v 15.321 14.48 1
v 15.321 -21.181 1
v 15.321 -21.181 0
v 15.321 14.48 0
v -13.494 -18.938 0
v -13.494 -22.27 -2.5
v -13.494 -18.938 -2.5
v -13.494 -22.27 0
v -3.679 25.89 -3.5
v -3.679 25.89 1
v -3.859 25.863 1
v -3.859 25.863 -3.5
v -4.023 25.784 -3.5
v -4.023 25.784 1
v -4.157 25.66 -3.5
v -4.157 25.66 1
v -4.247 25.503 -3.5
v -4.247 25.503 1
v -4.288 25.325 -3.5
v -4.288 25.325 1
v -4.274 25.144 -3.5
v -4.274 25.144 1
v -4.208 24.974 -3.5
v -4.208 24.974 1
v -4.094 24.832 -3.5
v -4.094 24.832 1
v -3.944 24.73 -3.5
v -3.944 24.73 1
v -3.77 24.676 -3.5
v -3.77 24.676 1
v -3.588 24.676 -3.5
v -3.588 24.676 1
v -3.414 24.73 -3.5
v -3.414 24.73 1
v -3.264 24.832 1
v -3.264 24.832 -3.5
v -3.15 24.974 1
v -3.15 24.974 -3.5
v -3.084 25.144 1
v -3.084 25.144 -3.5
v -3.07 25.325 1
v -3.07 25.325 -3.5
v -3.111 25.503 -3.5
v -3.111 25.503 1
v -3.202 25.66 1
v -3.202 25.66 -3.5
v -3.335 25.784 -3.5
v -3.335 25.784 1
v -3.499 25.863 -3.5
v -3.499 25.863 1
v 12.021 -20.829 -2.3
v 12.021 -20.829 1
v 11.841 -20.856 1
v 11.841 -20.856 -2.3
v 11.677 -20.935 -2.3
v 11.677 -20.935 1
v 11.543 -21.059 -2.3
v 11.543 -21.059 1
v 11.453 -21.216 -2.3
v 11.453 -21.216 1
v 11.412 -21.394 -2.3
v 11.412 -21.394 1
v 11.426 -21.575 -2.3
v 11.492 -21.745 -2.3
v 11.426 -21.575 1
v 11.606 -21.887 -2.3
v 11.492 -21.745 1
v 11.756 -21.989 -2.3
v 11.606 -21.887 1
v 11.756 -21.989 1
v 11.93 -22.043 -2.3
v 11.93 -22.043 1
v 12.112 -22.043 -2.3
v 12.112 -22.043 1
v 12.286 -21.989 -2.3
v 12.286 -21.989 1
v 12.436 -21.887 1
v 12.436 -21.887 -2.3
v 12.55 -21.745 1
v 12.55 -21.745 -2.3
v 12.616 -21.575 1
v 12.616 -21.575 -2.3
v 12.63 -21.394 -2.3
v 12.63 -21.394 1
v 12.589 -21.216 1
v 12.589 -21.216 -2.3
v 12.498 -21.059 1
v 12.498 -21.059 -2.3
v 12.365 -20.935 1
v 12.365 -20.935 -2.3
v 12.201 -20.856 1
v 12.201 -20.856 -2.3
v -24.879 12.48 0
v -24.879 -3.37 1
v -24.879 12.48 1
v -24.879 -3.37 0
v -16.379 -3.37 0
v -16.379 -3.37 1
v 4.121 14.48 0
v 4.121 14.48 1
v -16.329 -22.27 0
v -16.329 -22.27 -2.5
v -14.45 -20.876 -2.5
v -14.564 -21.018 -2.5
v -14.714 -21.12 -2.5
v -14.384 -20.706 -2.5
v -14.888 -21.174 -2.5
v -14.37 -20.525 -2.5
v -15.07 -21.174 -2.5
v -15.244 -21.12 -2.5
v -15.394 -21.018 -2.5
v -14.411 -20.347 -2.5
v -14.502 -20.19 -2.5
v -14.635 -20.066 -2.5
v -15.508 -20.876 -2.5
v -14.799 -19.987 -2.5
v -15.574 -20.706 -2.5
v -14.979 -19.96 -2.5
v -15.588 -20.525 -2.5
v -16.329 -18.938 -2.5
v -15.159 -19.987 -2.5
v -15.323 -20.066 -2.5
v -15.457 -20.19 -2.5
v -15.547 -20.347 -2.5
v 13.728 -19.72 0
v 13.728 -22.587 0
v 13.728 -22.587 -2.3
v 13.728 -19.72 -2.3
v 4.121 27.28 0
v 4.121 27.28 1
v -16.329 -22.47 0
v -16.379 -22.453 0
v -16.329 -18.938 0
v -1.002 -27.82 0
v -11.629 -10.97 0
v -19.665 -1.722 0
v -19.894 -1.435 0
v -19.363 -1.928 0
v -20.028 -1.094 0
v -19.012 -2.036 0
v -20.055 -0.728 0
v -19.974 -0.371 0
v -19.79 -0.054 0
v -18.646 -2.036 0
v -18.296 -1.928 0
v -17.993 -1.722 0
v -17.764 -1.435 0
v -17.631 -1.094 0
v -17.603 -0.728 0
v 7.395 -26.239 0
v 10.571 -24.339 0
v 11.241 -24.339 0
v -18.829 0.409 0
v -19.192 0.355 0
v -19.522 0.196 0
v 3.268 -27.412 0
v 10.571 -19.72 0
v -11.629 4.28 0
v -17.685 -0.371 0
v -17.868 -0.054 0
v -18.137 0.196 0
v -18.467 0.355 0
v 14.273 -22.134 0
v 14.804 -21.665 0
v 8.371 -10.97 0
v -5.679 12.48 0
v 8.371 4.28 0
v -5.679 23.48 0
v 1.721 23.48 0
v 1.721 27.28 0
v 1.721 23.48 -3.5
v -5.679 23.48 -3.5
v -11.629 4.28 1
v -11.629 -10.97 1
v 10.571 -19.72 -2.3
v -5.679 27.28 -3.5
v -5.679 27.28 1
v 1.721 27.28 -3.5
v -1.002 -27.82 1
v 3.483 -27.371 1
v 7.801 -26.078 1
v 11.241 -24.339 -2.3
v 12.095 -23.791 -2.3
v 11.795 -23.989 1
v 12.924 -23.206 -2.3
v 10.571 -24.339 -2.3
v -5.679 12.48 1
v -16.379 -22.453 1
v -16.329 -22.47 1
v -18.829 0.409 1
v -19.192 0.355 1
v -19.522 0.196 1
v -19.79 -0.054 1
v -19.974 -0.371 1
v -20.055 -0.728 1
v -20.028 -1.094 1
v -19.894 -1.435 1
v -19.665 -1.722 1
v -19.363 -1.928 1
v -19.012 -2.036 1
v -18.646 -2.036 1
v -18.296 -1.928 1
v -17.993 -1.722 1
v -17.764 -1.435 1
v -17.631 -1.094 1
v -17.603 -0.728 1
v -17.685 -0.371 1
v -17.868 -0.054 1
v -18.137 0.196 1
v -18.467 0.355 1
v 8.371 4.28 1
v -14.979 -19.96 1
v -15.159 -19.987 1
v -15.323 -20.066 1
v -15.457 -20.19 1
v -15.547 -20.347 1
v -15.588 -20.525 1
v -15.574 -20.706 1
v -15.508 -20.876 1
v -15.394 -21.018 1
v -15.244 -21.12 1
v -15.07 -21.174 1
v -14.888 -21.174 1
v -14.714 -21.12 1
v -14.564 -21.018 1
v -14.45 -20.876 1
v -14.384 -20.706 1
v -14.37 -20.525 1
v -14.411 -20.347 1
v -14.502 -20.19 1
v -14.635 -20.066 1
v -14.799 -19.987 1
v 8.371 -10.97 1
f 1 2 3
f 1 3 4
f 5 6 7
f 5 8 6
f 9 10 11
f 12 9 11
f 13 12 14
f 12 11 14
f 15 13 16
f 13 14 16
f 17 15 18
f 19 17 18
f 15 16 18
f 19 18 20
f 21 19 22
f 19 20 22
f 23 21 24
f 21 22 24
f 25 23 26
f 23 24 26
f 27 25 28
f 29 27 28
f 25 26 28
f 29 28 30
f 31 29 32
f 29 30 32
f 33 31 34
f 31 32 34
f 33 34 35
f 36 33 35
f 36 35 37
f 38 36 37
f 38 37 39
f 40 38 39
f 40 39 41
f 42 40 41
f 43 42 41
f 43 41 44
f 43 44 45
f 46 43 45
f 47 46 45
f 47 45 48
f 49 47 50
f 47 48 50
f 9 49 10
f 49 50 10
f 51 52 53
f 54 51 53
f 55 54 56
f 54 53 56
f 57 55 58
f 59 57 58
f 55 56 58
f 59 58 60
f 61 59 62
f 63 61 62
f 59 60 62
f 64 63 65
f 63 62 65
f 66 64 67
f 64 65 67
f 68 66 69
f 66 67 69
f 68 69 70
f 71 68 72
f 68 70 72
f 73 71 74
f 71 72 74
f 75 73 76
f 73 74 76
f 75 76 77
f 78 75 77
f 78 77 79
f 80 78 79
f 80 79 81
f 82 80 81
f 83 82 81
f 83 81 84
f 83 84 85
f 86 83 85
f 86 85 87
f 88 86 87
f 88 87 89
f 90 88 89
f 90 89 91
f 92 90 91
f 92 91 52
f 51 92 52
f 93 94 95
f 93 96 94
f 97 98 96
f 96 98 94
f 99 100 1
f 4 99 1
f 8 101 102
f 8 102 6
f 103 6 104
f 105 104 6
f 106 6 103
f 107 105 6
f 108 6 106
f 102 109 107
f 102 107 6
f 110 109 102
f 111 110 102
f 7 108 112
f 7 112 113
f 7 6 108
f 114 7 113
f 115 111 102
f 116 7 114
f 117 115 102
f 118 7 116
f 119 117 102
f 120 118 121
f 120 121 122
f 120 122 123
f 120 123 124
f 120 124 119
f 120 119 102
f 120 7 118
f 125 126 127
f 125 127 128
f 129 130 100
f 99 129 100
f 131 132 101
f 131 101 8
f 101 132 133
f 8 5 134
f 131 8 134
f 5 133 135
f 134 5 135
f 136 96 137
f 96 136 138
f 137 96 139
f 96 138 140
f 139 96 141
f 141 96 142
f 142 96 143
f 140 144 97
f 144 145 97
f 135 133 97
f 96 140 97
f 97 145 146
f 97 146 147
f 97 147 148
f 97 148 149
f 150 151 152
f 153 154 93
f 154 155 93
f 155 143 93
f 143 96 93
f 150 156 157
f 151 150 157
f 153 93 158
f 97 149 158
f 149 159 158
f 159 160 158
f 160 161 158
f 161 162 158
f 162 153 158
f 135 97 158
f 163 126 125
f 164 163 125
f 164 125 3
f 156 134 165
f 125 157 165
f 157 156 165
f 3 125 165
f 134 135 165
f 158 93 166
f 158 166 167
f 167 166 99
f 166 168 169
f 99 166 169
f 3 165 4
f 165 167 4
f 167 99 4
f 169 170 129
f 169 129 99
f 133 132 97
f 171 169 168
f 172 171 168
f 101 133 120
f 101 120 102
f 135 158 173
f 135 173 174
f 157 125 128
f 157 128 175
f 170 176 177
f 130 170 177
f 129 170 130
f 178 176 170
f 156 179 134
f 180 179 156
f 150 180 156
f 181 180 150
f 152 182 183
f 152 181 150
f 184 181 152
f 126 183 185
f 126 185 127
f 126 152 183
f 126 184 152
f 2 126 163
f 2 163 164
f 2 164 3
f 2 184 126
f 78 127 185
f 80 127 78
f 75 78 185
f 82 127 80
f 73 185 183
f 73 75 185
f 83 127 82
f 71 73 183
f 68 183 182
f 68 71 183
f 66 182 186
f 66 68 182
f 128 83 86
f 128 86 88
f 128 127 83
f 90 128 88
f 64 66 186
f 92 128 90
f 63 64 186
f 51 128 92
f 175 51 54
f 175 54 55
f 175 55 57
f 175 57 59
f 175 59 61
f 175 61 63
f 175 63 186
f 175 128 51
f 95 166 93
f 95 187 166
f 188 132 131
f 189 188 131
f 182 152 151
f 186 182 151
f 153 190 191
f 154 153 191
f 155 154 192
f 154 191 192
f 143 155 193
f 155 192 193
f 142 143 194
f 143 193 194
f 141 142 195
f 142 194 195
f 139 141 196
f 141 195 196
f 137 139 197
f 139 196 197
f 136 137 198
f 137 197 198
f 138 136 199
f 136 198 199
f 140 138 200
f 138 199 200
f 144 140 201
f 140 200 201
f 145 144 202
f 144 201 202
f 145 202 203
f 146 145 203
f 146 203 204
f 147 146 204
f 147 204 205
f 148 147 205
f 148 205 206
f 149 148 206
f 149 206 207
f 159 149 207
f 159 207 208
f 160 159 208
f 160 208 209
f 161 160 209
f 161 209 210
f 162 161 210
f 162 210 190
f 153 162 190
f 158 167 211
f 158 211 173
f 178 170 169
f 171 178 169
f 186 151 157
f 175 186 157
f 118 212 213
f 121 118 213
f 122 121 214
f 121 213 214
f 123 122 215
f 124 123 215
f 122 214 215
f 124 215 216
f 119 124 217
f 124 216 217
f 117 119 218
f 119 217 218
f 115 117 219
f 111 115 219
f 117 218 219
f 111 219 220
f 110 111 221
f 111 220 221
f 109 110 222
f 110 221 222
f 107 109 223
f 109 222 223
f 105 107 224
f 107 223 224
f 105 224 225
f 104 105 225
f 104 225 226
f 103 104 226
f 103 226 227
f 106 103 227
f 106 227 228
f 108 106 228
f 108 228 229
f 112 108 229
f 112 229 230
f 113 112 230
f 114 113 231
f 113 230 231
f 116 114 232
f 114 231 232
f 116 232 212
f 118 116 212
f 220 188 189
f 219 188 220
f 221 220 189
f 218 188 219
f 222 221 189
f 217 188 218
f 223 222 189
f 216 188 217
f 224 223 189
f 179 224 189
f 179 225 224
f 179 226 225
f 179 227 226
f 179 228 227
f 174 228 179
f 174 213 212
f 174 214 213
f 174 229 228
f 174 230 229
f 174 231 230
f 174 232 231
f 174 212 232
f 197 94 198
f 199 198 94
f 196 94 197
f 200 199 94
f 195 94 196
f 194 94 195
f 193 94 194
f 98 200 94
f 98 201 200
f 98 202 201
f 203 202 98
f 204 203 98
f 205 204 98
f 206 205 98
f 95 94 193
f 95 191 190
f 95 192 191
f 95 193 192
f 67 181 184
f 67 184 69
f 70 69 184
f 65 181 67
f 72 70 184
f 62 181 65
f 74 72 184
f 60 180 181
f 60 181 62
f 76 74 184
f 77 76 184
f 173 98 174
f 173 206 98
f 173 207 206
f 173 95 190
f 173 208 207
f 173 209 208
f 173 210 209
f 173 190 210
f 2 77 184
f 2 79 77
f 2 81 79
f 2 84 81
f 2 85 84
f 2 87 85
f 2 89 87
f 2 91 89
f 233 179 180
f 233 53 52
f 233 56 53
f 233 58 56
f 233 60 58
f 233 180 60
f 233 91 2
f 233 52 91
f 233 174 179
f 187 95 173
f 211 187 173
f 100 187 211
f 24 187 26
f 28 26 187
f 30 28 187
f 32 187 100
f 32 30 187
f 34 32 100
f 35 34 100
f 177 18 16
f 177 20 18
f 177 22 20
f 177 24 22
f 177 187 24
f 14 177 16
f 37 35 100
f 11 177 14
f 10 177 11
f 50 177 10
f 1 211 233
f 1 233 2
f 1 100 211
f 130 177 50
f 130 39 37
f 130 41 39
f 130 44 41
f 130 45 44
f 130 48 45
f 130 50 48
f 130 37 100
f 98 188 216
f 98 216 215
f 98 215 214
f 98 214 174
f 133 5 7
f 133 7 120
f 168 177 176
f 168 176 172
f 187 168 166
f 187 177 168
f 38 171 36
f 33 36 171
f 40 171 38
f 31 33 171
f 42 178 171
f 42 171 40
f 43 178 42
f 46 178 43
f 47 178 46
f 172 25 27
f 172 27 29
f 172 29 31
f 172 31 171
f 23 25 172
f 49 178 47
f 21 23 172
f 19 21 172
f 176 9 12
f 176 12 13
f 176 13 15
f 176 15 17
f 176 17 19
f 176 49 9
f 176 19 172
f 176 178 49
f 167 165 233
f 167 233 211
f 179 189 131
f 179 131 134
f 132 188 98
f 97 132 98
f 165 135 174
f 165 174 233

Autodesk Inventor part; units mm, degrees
ref_plane "YZ Plane" through (0, 0, 0) normal (1, 0, 0) x (0, 1, 0)
ref_plane "XZ Plane" through (0, 0, 0) normal (0, 1, 0) x (-1, 0, 0)
ref_plane "XY Plane" through (0, 0, 0) normal (0, 0, 1) x (1, 0, 0)
sketch "Skizze1" plane through (0, 0, 0) normal (0, 0, 1) x (1, 0, 0)
  circle A0 centre (-18.8292, -0.8203) radius 1.45 construction
  line L0 (-24.8792, -2.7703) -> (-24.8792, 8.6797) construction
  arc A1 (-11.8792, -25.2203) -> (6.3208, -26.6782) centre (-1.0025, -3.77) ccw construction
  circle A2 centre (-14.9792, -20.5703) radius 0.9 construction
  circle A3 centre (12.0208, -21.4394) radius 0.9 construction
  circle A4 centre (-3.6792, 25.2797) radius 0.9 construction
  line L1 (-5.6792, 27.2797) -> (3.4208, 27.2797) construction
  line L2 (25.1208, 7.4797) -> (25.1208, -1.5203) construction
  line L3 (25.1208, -27.8203) -> (-24.8792, -27.8203)
  line L4 (-24.8792, -27.8203) -> (-24.8792, 27.2797)
  line L5 (-24.8792, 27.2797) -> (25.1208, 27.2797)
  line L6 (25.1208, 27.2797) -> (25.1208, -27.8203)
  line L7 (4.6208, 0.2797) -> (4.6208, -6.9703) construction
  line L8 (-4.8792, 0.2797) -> (4.6208, 0.2797) construction
  line L9 (-4.8792, -6.9703) -> (-4.8792, 0.2797) construction
  line L10 (4.6208, -6.9703) -> (-4.8792, -6.9703) construction
  line L11 (-2.2292, 2.2797) -> (1.9708, 2.2797) construction
  line L12 (6.3708, 2.2797) -> (1.9708, 2.2797) construction
  line L13 (6.3708, -8.9703) -> (6.3708, 2.2797) construction
  line L14 (1.9708, -8.9703) -> (6.3708, -8.9703) construction
  line L15 (1.9708, -8.9703) -> (-2.2292, -8.9703) construction
  line L16 (-6.6292, -8.9703) -> (-2.2292, -8.9703) construction
  line L17 (-6.6292, 2.2797) -> (-6.6292, -8.9703) construction
  line L18 (-2.2292, 2.2797) -> (-6.6292, 2.2797) construction
  line L19 (-11.6292, -10.9703) -> (8.3708, -10.9703)
  line L20 (8.3708, -10.9703) -> (8.3708, 4.2797)
  line L21 (8.3708, 4.2797) -> (-11.6292, 4.2797)
  line L22 (-11.6292, 4.2797) -> (-11.6292, -10.9703)
  point P0 (0, 0)
  dimension "d48" = 2
  dimension "d49" = 2
  dimension "d50" = 2
  dimension "d51" = 5
extrude "Extrusion1" add sketch "Skizze1" along normal blind 1
sketch "Skizze2" plane through (0, 0, 0) normal (0, 0, -1) x (-1, 0, 0)
  circle A0 centre (14.9792, -20.5703) radius 0.9 projected
  circle A1 centre (-12.0208, -21.4394) radius 0.9 construction
  circle A2 centre (3.6792, 25.2797) radius 0.9 construction
  circle A3 centre (14.9792, -20.5703) radius 0.9 projected
  circle A4 centre (9.7292, -19.9703) radius 0.75 projected
  line L0 (17.9792, -20.8203) -> (16.3292, -20.8203) construction
  line L1 (7.7292, -22.4703) -> (11.8792, -22.4703) construction
  line L2 (7.7292, -17.4703) -> (7.7292, -22.4703) construction
  line L3 (16.3292, -17.4703) -> (7.7292, -17.4703) construction
  line L4 (16.3292, -20.8203) -> (16.3292, -17.4703) construction
  line L5 (16.3292, -22.2703) -> (7.9292, -22.2703)
  line L6 (7.9292, -22.2703) -> (7.9292, -17.6703)
  line L7 (7.9292, -17.6703) -> (16.3292, -17.6703)
  line L8 (16.3292, -17.6703) -> (16.3292, -22.2703)
  line L9 (11.8792, -22.2703) -> (12.162, -22.2703) construction
  line L10 (16.3292, -17.6703) -> (12.3496, -17.6703)
  line L11 (12.3496, -17.6703) -> (12.3496, -22.2703)
  line L12 (12.3496, -22.2703) -> (16.3292, -22.2703)
  line L13 (16.3292, -22.2703) -> (16.3292, -17.6703)
  line L14 (16.3292, -22.2703) -> (13.494, -22.2703)
  line L15 (13.494, -22.2703) -> (13.494, -18.9379)
  line L16 (13.494, -18.9379) -> (16.3292, -18.9379)
  line L17 (16.3292, -18.9379) -> (16.3292, -22.2703)
  point P0 (0, 0)
  dimension "d3" = 0.2
  dimension "d4" = 0.2
  dimension "d9" = 0.2
extrude "Extrusion2" add sketch "Skizze2" along normal blind 2.5 contours A0 | L5 L15 L16 L8
sketch "Skizze3" plane through (0, 0, -2.5) normal (0, 0, -1) x (-1, 0, 0)
  circle A0 centre (14.9792, -20.5703) radius 0.9 construction
  point P0 (0, 0)
hole "Bohrung1" at (-14.9792, -20.5703, -2.5) direction (0, 0, 1) diameter 1.221 depth 6.1 tip angle 118 thread size "M1.6x0.35" class "6H" standard "ISO Metric profile"
sketch "Skizze4" plane through (0, 0, 0) normal (0, 0, -1) x (-1, 0, 0)
  circle A0 centre (18.8292, -0.8203) radius 1.45 construction
  point P0 (0, 0)
hole "Bohrung2" at (-18.8292, -0.8203, 0) direction (0, 0, 1) diameter 2.459 end through all thread size "M3x0.5" class "6H" standard "ISO Metric profile"
sketch "Skizze5" plane through (0, 0, 0) normal (0, 0, -1) x (-1, 0, 0)
  line L0 (-9.3708, -21.4703) -> (-9.3708, -17.9703) construction
  line L1 (-14.1208, -16.9703) -> (-14.1208, -22.4703) construction
  line L2 (-15.3208, -16.9703) -> (-10.3708, -16.9703) construction
  line L3 (-9.3708, -17.9703) -> (-10.3708, -16.9703) construction
  line L4 (-9.3708, -21.4703) -> (-9.3708, -17.9703) construction
  line L5 (-10.5708, -16.9703) -> (-15.3208, -16.9703)
  line L6 (-15.3208, -16.9703) -> (-15.3208, -24.3394)
  line L7 (-15.3208, -24.3394) -> (-10.5708, -24.3394)
  line L8 (-10.5708, -24.3394) -> (-10.5708, -16.9703)
  line L9 (-15.3208, -16.9703) -> (-15.3208, -1.5203) construction
  circle A0 centre (-12.0208, -21.4394) radius 0.9 construction
  line L10 (-10.5708, -24.3394) -> (-13.7279, -24.3394)
  line L11 (-13.7279, -24.3394) -> (-13.7279, -16.9703)
  line L12 (-13.7279, -16.9703) -> (-10.5708, -16.9703)
  line L13 (-10.5708, -16.9703) -> (-10.5708, -24.3394)
  line L14 (-10.5708, -24.3394) -> (-13.7279, -24.3394)
  line L15 (-13.7279, -24.3394) -> (-13.7279, -19.7203)
  line L16 (-13.7279, -19.7203) -> (-10.5708, -19.7203)
  line L17 (-10.5708, -19.7203) -> (-10.5708, -24.3394)
  point P0 (0, 0)
extrude "Extrusion3" add sketch "Skizze5" along normal blind 2.3 contours L8 L7 L11 L16
sketch "Skizze6" plane through (0, 0, -2.3) normal (0, 0, -1) x (-1, 0, 0)
  circle A0 centre (-12.0208, -21.4394) radius 0.9 construction
  point P0 (0, 0)
hole "Bohrung3" at (12.0208, -21.4394, -2.3) direction (0, 0, 1) diameter 1.221 depth 7.1 tip angle 118 thread size "M1.6x0.35" class "6H" standard "ISO Metric profile"
sketch "Skizze7" plane through (0, 0, 0) normal (0, 0, -1) x (-1, 0, 0)
  circle A0 centre (3.6792, 25.2797) radius 0.9 construction
  line L0 (-3.4208, 24.7797) -> (-3.4208, 27.2797) construction
  line L1 (-1.9208, 24.7797) -> (-3.4208, 24.7797) construction
  line L2 (-1.9208, 23.2797) -> (-1.9208, 24.7797) construction
  line L3 (5.6792, 23.2797) -> (-1.9208, 23.2797) construction
  line L4 (5.6792, 27.2797) -> (5.6792, 23.2797) construction
  line L5 (-3.4208, 27.2797) -> (5.6792, 27.2797) construction
  line L6 (6.6792, 27.2797) -> (-1.7208, 27.2797)
  line L7 (-1.7208, 27.2797) -> (-1.7208, 23.4797)
  line L8 (-1.7208, 23.4797) -> (6.6792, 23.4797)
  line L9 (6.6792, 23.4797) -> (6.6792, 27.2797)
  point P0 (0, 0)
  dimension "d35" = 0.2
  dimension "d36" = 0.2
  dimension "d38" = 3
extrude "Extrusion4" add sketch "Skizze7" along normal blind 3.5
sketch "Skizze8" plane through (0, 0, -3.5) normal (0, 0, -1) x (-1, 0, 0)
  circle A0 centre (3.6792, 25.2797) radius 0.9 construction
  point P0 (0, 0)
hole "Bohrung4" at (-3.6792, 25.2797, -3.5) direction (0, 0, 1) diameter 1.221 depth 7.1 tip angle 118 thread size "M1.6x0.35" class "6H" standard "ISO Metric profile"
sketch "Sketch9" plane through (0, 0, 1) normal (0, 0, 1) x (1, 0, 0)
  circle A0 centre (-18.8292, -0.8203) radius 1.45 construction
  line L0 (-22.6792, 10.4902) -> (-22.6792, -2.5703) construction
  line L1 (-22.6792, -2.5703) -> (-21.2792, -2.5703) construction
  line L2 (-21.2792, -2.5703) -> (-21.2792, 8.1297) construction
  arc A1 (-19.5792, 9.8297) -> (-21.2792, 8.1297) centre (-19.5792, 8.1297) ccw construction
  line L3 (-19.5792, 9.8297) -> (-13.5792, 9.8297) construction
  line L4 (-13.5792, 9.8297) -> (-13.5792, 11.4797) construction
  line L5 (-13.5792, 11.4797) -> (-22.1079, 11.4797) construction
  line L6 (-22.1079, 11.4797) -> (-22.6792, 10.4902) construction
  line L7 (-5.6792, 23.2797) -> (1.9208, 23.2797) construction
  line L8 (1.9208, 23.2797) -> (1.9208, 24.7797) construction
  line L9 (1.9208, 24.7797) -> (4.1208, 24.7797) construction
  line L10 (4.1208, 24.7797) -> (4.1208, 14.4797) construction
  line L11 (4.1208, 14.4797) -> (20.1208, 14.4797) construction
  line L12 (20.1208, 14.4797) -> (20.1208, 12.4797) construction
  line L13 (20.1208, 12.4797) -> (22.2341, 12.4797) construction
  line L14 (22.2341, 12.4797) -> (25.1208, 7.4797) construction
  line L15 (25.1208, 7.4797) -> (25.1208, -1.5203) construction
  line L16 (25.1208, -1.5203) -> (15.8208, -1.5203) construction
  line L17 (15.8208, -1.5203) -> (15.8208, -0.8203) construction
  line L18 (15.8208, -0.8203) -> (11.8208, -0.8203) construction
  line L19 (11.8208, -0.8203) -> (11.8208, -19.3203) construction
  line L20 (11.8208, -19.3203) -> (10.8208, -19.3203) construction
  line L21 (10.8208, -19.3203) -> (10.8208, 0.6797) construction
  line L22 (10.8208, 0.6797) -> (11.8208, 0.6797) construction
  line L23 (11.8208, 0.6797) -> (11.8208, 10.4297) construction
  line L24 (11.8208, 10.4297) -> (5.3208, 10.4297) construction
  line L25 (5.3208, 10.4297) -> (5.3208, 9.1297) construction
  line L26 (5.3208, 9.1297) -> (-19.5792, 9.1297) construction
  arc A2 (-19.5792, 9.1297) -> (-20.5792, 8.1297) centre (-19.5792, 8.1297) ccw construction
  line L27 (-20.5792, 8.1297) -> (-20.5792, 2.1297) construction
  arc A3 (-20.5792, 2.1297) -> (-20.0792, 1.6297) centre (-20.0792, 2.1297) ccw construction
  line L28 (-20.0792, 1.6297) -> (-18.8292, 1.6297) construction
  arc A4 (-16.3792, -0.8203) -> (-18.8292, 1.6297) centre (-18.8292, -0.8203) ccw construction
  line L29 (-16.3792, -0.8203) -> (-16.3792, -1.3703) construction
  arc A5 (-18.3792, -3.3703) -> (-16.3792, -1.3703) centre (-18.3792, -1.3703) ccw construction
  line L30 (-18.3792, -3.3703) -> (-23.4792, -3.3703) construction
  line L31 (-23.4792, -3.3703) -> (-23.4792, 11.1046) construction
  line L32 (-23.4792, 11.1046) -> (-22.6852, 12.4797) construction
  line L33 (-22.6852, 12.4797) -> (-13.6792, 12.4797) construction
  arc A6 (-13.6792, 12.4797) -> (-5.6792, 20.4797) centre (-13.6792, 20.4797) ccw construction
  line L34 (-5.6792, 20.4797) -> (-5.6792, 23.2797) construction
  line L35 (-7.8792, -20.1624) -> (-7.8792, -26.8162) construction
  arc A7 (-9.8792, -26.1222) -> (-7.8792, -26.8162) centre (-1.0025, -3.77) ccw construction
  line L36 (-9.8792, -26.1222) -> (-9.8792, -22.1222) construction
  line L37 (-9.8792, -22.1222) -> (-13.6811, -18.3203) construction
  line L38 (-13.6811, -18.3203) -> (-16.6811, -18.3203) construction
  line L39 (-16.6811, -18.3203) -> (-16.6811, -20.8203) construction
  line L40 (-24.8792, -20.8203) -> (-16.6811, -20.8203) construction
  line L41 (-24.8792, -3.3703) -> (-24.8792, -20.8203) construction
  line L42 (-18.3792, -3.3703) -> (-24.8792, -3.3703) construction
  arc A8 (-18.3792, -3.3703) -> (-16.3792, -1.3703) centre (-18.3792, -1.3703) ccw construction
  line L43 (-16.3792, -15.8703) -> (-16.3792, -1.3703) construction
  line L44 (-12.1713, -15.8703) -> (-16.3792, -15.8703) construction
  line L45 (-12.1713, -15.8703) -> (-7.8792, -20.1624) construction
  line L46 (9.3208, 7.5297) -> (11.8208, 7.5297) construction
  line L47 (11.8208, 0.6797) -> (11.8208, 7.5297) construction
  line L48 (10.8208, 0.6797) -> (11.8208, 0.6797) construction
  line L49 (10.8208, -19.3203) -> (10.8208, 0.6797) construction
  line L50 (11.8208, -19.3203) -> (10.8208, -19.3203) construction
  line L51 (11.8208, -0.8203) -> (11.8208, -19.3203) construction
  line L52 (15.8208, -0.8203) -> (11.8208, -0.8203) construction
  line L53 (15.8208, -1.5203) -> (15.8208, -0.8203) construction
  line L54 (15.3208, -1.5203) -> (15.8208, -1.5203) construction
  line L55 (15.3208, -16.9703) -> (15.3208, -1.5203) construction
  line L56 (14.1208, -16.9703) -> (15.3208, -16.9703) construction
  line L57 (14.1208, -20.2394) -> (14.1208, -16.9703) construction
  line L58 (14.1208, -20.2394) -> (13.6208, -20.2394) construction
  arc A9 (13.6208, -20.2394) -> (10.0208, -21.4394) centre (12.0208, -21.4394) ccw construction
  line L59 (10.0208, -21.4394) -> (10.0208, -25.1453) construction
  arc A10 (-1.5792, -27.8134) -> (10.0208, -25.1453) centre (-1.0025, -3.77) ccw construction
  line L60 (-1.5792, -27.8134) -> (-1.5792, -26.4134) construction
  line L61 (-1.5792, -26.4134) -> (0.4208, -26.4134) construction
  line L62 (0.4208, -26.4134) -> (0.9208, -25.9134) construction
  line L63 (0.9208, -25.9134) -> (2.9208, -25.9134) construction
  line L64 (2.9208, -25.9134) -> (3.4208, -25.4134) construction
  line L65 (3.4208, -25.4134) -> (5.4208, -25.4134) construction
  line L66 (5.4208, -25.4134) -> (9.0208, -21.8134) construction
  line L67 (9.0208, -21.8134) -> (9.0208, -19.0634) construction
  arc A11 (9.0208, -19.0634) -> (6.6502, -18.7996) centre (7.8502, -18.7996) ccw construction
  line L68 (6.6502, -18.7996) -> (6.6502, -17.7996) construction
  line L69 (6.6502, -17.7996) -> (2.1208, -13.2703) construction
  line L70 (2.1208, -13.2703) -> (-13.8792, -13.2703) construction
  line L71 (-13.8792, 0.1297) -> (-13.8792, -13.2703) construction
  arc A12 (-13.8792, 0.1297) -> (-15.8792, 2.1297) centre (-15.8792, 0.1297) ccw construction
  line L72 (-16.9792, 2.1297) -> (-15.8792, 2.1297) construction
  arc A13 (-17.9792, 3.1297) -> (-16.9792, 2.1297) centre (-16.9792, 3.1297) ccw construction
  line L73 (-17.9792, 4.5047) -> (-17.9792, 3.1297) construction
  arc A14 (-15.9792, 6.5047) -> (-17.9792, 4.5047) centre (-15.9792, 4.5047) ccw construction
  line L74 (-15.9792, 6.5047) -> (7.845, 6.5047) construction
  arc A15 (7.845, 6.5047) -> (9.3208, 7.5297) centre (9.3208, 5.9547) ccw construction
  line L75 (-2.2292, 2.2797) -> (-6.6292, 2.2797) construction
  line L76 (-6.6292, 2.2797) -> (-6.6292, -8.9703) construction
  line L77 (-6.6292, -8.9703) -> (-2.2292, -8.9703) construction
  line L78 (-2.2292, -8.9703) -> (-2.2292, -9.9953) construction
  line L79 (-2.2292, -9.9953) -> (1.9708, -9.9953) construction
  line L80 (1.9708, -9.9953) -> (1.9708, -8.9703) construction
  line L81 (1.9708, -8.9703) -> (6.3708, -8.9703) construction
  line L82 (6.3708, -8.9703) -> (6.3708, 2.2797) construction
  line L83 (6.3708, 2.2797) -> (1.9708, 2.2797) construction
  line L84 (1.9708, 2.2797) -> (1.9708, 3.3047) construction
  line L85 (1.9708, 3.3047) -> (-2.2292, 3.3047) construction
  line L86 (-2.2292, 3.3047) -> (-2.2292, 2.2797) construction
  circle A16 centre (-12.8292, 4.1297) radius 1.575 construction
  circle A17 centre (7.8502, -14.7996) radius 1.575 construction
  circle A18 centre (-15.8292, 4.1297) radius 0.75 construction
  line L87 (16.6208, -9.5203) -> (16.6208, -1.5203) construction
  line L88 (24.6208, -9.5203) -> (24.6208, -1.5203) construction
  circle A19 centre (-3.6792, 25.2797) radius 0.6105 projected
  circle A20 centre (12.0208, -21.4394) radius 0.6105 projected
  circle A21 centre (-18.8292, -0.8203) radius 1.2295 projected
  circle A22 centre (-14.9792, -20.5703) radius 0.6105 projected
  line L89 (-11.6292, -10.9703) -> (-11.6292, 4.2797) projected
  line L90 (-11.6292, 4.2797) -> (8.3708, 4.2797) projected
  line L91 (8.3708, 4.2797) -> (8.3708, -10.9703) projected
  line L92 (8.3708, -10.9703) -> (-11.6292, -10.9703) projected
  line L93 (-24.8792, -27.8203) -> (25.1208, -27.8203) projected
  line L94 (25.1208, -27.8203) -> (25.1208, 27.2797) projected
  line L95 (25.1208, 27.2797) -> (-24.8792, 27.2797) projected
  line L96 (-24.8792, 27.2797) -> (-24.8792, -27.8203) projected
  line L97 (25.1208, 27.2797) -> (25.1208, -27.8203) projected
  line L98 (25.1208, 27.2797) -> (4.1208, 27.2797)
  line L99 (4.1208, 27.2797) -> (4.1208, 14.4797)
  line L100 (4.1208, 14.4797) -> (25.1208, 14.4797)
  line L101 (25.1208, 14.4797) -> (25.1208, 27.2797)
  line L102 (-24.8792, 27.2797) -> (-6.6792, 27.2797) projected
  line L103 (-24.8792, 27.2797) -> (-5.6792, 27.2797)
  line L104 (-5.6792, 27.2797) -> (-5.6792, 12.4797)
  line L105 (-5.6792, 12.4797) -> (-24.8792, 12.4797)
  line L106 (-24.8792, 12.4797) -> (-24.8792, 27.2797)
  line L107 (25.1208, -27.8203) -> (15.3208, -27.8203)
  line L108 (15.3208, -27.8203) -> (15.3208, 14.4797)
  line L109 (15.3208, 14.4797) -> (25.1208, 14.4797)
  line L110 (25.1208, 14.4797) -> (25.1208, -27.8203)
  line L111 (-24.8792, -27.8203) -> (-16.3792, -27.8203)
  line L112 (-16.3792, -27.8203) -> (-16.3792, -3.3703)
  line L113 (-16.3792, -3.3703) -> (-24.8792, -3.3703)
  line L114 (-24.8792, -3.3703) -> (-24.8792, -27.8203)
  line L115 (-16.3292, -22.2703) -> (-7.9292, -22.2703) projected
  line L116 (15.3208, -16.9703) -> (15.3208, -24.3394) projected
  arc A23 (-16.3292, -22.2703) -> (15.3208, -21.1808) centre (-1.1083, -4.1747) ccw
  line L117 (-16.3292, -22.2703) -> (-16.3792, -22.2703)
  line L118 (25.1208, -27.8203) -> (-24.8792, -27.8203) projected
  line L119 (-7.9292, -22.2703) -> (-16.3292, -22.2703) projected
  line L120 (-16.3292, -22.2703) -> (-1.0025, -27.8203)
  point P0 (0, 0)
  point P1 (-21.6292, -3.3703)
extrude "Extrusion5" cut sketch "Sketch9" against normal blind 10 contours L96 L113 L112 L93 | A23 L108 L93 | L96 L95 L104 L105 | L108 L100 L94 L93 | L100 L99 L95 L94
sketch "Sketch11" plane through (0, 0, 1) normal (0, 0, 1) x (1, 0, 0)
  arc A0 (-1.0025, -27.8203) -> (15.3208, -21.1808) centre (-1.1083, -4.1747) ccw projected
  point P0 (0, 0)
sketch "Sketch12" plane through (0, 0, 1) normal (0, 0, 1) x (1, 0, 0)
  line L0 (-11.6292, -10.9703) -> (-11.6292, 4.2797) projected
  line L1 (-11.6292, 4.2797) -> (8.3708, 4.2797) projected
  line L2 (8.3708, 4.2797) -> (8.3708, -10.9703) projected
  line L3 (8.3708, -10.9703) -> (-11.6292, -10.9703) projected
  circle A0 centre (-14.9792, -20.5703) radius 0.6105 projected
  circle A1 centre (-18.8292, -0.8203) radius 1.2295 projected
  circle A2 centre (12.0208, -21.4394) radius 0.6105 projected
  circle A3 centre (-3.6792, 25.2797) radius 0.6105 projected
  arc A4 (-1.0025, -27.8203) -> (15.3208, -21.1808) centre (-1.1083, -4.1747) ccw projected
  line L4 (15.3208, -21.1808) -> (15.3208, 14.4797) projected
  line L5 (15.3208, 14.4797) -> (4.1208, 14.4797) projected
  line L6 (4.1208, 14.4797) -> (4.1208, 27.2797) projected
  line L7 (4.1208, 27.2797) -> (-5.6792, 27.2797) projected
  line L8 (-5.6792, 27.2797) -> (-5.6792, 12.4797) projected
  line L9 (-5.6792, 12.4797) -> (-24.8792, 12.4797) projected
  line L10 (-24.8792, 12.4797) -> (-24.8792, -3.3703) projected
  line L11 (-24.8792, -3.3703) -> (-16.3792, -3.3703) projected
  line L12 (-16.3792, -3.3703) -> (-16.3792, -27.8203) projected
  line L13 (-16.3792, -27.8203) -> (-1.0025, -27.8203) projected
  line L14 (-16.3292, -22.4703) -> (-17.9792, -20.8203) projected
  line L15 (-16.3792, -27.8203) -> (-1.0025, -27.8203) projected
  arc A5 (-1.0025, -27.8203) -> (15.3208, -21.1808) centre (-1.1083, -4.1747) ccw projected
  line L16 (-16.3292, -22.4703) -> (-1.0025, -27.8203)
  line L17 (-17.5522, -22.0433) -> (2.1832, -28.9323)
  line L18 (2.1832, -28.9323) -> (-1.056, -38.212)
  line L19 (-1.056, -38.212) -> (-20.7914, -31.323)
  line L20 (-20.7914, -31.323) -> (-17.5522, -22.0433)
  point P0 (0, 0)
extrude "Extrusion6" cut sketch "Sketch12" against normal blind 10 contours L17 L18 L19 L20 L12 L13 | L13 L12 L17 L16
properties part number "01_XY_Baseplate"
